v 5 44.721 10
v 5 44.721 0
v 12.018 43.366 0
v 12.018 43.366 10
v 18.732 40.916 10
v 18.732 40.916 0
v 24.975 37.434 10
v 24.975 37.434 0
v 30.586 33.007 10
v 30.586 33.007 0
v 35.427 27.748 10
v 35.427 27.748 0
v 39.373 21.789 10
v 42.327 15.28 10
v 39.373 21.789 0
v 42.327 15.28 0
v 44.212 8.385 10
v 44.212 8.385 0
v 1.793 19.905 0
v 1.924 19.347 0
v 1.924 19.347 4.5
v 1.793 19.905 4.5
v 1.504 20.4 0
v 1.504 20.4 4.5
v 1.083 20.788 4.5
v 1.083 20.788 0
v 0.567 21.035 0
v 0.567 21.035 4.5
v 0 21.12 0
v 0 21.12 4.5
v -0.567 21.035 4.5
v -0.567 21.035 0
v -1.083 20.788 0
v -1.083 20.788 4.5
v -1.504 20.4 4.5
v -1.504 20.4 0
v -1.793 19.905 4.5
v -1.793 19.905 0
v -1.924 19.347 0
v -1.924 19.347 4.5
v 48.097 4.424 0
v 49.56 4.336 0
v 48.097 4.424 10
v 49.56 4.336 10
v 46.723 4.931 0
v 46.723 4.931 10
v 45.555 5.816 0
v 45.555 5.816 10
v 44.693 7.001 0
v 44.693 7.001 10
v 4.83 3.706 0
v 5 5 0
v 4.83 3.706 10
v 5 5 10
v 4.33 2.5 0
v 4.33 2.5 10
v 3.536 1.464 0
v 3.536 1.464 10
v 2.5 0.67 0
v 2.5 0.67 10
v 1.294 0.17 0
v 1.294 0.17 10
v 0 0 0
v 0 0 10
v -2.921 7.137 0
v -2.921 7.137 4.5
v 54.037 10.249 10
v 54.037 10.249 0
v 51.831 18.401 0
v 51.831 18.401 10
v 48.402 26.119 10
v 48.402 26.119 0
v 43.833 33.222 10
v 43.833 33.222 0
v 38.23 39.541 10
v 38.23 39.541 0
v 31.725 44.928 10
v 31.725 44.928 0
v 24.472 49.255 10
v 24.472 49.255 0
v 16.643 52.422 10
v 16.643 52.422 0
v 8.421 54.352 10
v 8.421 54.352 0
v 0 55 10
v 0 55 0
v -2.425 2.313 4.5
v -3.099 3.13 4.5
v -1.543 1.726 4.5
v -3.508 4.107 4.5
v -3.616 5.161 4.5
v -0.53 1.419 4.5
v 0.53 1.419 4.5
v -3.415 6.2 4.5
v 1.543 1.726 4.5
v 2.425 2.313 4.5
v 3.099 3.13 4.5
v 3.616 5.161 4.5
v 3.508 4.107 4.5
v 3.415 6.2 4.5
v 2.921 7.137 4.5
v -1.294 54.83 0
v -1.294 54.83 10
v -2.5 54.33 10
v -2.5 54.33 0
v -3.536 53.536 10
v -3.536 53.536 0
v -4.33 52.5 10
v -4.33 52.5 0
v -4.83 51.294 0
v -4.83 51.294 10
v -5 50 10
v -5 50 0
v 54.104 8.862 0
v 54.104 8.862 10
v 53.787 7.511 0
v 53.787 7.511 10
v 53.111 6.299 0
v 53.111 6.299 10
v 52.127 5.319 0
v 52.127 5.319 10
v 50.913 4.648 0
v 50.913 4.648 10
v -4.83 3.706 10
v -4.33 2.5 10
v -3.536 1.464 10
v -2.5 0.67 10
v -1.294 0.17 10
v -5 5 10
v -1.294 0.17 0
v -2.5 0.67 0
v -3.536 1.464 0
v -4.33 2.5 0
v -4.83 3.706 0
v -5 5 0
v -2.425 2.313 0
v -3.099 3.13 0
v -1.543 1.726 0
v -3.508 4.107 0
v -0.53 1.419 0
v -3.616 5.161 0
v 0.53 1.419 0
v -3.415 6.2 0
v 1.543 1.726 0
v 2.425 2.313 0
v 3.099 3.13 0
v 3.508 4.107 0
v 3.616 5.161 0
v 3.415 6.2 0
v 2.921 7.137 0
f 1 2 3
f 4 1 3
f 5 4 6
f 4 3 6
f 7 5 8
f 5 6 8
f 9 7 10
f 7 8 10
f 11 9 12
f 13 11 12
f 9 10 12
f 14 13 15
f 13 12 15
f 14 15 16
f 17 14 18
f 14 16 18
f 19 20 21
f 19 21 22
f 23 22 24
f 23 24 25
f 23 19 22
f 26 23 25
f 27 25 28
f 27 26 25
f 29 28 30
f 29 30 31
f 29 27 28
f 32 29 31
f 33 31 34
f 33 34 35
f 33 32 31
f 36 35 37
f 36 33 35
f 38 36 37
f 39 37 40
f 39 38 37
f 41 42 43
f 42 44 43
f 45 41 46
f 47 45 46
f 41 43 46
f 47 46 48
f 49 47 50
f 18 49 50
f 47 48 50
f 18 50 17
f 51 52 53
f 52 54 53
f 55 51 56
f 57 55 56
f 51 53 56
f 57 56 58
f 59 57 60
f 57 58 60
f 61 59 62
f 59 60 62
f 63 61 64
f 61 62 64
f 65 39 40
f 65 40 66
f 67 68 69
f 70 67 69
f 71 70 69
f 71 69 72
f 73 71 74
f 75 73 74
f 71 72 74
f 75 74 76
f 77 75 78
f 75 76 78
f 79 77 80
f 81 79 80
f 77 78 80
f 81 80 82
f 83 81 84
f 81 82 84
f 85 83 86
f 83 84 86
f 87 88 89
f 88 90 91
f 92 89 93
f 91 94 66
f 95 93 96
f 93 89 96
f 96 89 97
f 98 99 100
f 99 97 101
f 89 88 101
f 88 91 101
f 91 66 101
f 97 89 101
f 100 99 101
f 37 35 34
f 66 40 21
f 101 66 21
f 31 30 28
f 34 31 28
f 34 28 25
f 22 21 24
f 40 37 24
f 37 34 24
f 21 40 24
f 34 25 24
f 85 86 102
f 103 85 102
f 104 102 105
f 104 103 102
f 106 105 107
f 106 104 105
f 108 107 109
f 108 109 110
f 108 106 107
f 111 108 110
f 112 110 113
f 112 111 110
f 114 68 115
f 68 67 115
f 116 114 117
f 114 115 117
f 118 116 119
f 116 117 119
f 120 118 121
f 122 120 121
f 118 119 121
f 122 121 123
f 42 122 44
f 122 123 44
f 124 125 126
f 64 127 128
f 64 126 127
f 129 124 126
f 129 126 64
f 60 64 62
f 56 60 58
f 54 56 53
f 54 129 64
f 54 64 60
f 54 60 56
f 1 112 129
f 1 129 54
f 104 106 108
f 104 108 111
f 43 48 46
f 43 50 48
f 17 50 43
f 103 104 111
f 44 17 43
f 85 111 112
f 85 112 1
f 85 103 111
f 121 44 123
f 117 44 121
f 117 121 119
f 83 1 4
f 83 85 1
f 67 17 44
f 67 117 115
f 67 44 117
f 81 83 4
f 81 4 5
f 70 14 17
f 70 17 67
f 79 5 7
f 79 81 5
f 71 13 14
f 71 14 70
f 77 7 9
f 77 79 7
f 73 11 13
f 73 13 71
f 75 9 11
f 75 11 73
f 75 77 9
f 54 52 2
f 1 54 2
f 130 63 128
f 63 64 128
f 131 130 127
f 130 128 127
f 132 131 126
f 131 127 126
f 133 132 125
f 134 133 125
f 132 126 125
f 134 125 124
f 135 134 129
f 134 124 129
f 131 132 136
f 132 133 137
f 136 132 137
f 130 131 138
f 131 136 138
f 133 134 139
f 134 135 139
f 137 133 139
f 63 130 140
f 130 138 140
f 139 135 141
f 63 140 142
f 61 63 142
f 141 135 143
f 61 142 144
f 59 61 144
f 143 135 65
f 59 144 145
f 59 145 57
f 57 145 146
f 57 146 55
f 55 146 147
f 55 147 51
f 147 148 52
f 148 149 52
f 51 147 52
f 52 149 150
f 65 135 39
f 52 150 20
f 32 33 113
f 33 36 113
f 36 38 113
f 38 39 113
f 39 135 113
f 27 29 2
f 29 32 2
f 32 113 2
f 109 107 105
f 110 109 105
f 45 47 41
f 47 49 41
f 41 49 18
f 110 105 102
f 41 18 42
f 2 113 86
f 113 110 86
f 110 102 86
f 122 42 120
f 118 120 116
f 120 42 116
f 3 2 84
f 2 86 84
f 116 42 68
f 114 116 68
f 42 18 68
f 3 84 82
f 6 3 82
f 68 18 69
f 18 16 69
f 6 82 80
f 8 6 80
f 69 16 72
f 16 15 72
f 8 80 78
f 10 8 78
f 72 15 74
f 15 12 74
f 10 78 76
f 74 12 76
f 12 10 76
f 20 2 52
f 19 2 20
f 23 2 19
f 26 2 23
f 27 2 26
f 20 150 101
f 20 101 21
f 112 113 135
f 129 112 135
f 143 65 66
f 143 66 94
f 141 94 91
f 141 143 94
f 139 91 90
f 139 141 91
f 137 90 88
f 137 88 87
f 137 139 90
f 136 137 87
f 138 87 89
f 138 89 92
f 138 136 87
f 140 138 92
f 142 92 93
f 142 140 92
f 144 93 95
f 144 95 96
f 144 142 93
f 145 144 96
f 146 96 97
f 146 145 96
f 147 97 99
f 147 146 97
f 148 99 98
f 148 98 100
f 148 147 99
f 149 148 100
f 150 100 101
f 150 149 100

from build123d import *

# Parameters (mm, degrees)
EXTRUDE_THIN1_DEPTH = 10
FILLET1_R           = 5
FILLET2_R           = 5
FILLET3_R           = 5
FILLET4_R           = 5
FILLET5_R           = 5
CUT_EXTRUDE1_DEPTH  = 4.5


with BuildPart() as part:
    # Sketch1 → Extrude-Thin1 (new body)
    with BuildSketch(Plane.XY):
        with BuildLine():
            Line((5, 0), (5, 44.72135955))
            ThreePointArc((5, 44.72135955), (32.200514423, 31.434485377), (44.828761414, 3.922008424))
            Line((44.828761414, 3.922008424), (54.790708395, 4.793565851))
            ThreePointArc((54.790708395, 4.793565851), (35.273871656, 42.198980774), (-5, 54.772255751))
            Line((-5, 54.772255751), (-5, 0))
            Line((-5, 0), (5, 0))
        make_face()
    extrude(amount=EXTRUDE_THIN1_DEPTH)

    # Fillet1
    fillet1_edges = [part.edges().sort_by_distance(p)[0] for p in [
        (-5, 54.772255751, 5),
    ]]
    fillet(fillet1_edges, radius=FILLET1_R)

    # Fillet2
    fillet2_edges = [part.edges().sort_by_distance(p)[0] for p in [
        (54.790708395, 4.793565851, 5),
    ]]
    fillet(fillet2_edges, radius=FILLET2_R)

    # Fillet3
    fillet3_edges = [part.edges().sort_by_distance(p)[0] for p in [
        (44.828761414, 3.922008424, 5),
    ]]
    fillet(fillet3_edges, radius=FILLET3_R - 0.0001)  # a hair under: the kernel refuses the full size

    # Fillet4
    fillet4_edges = [part.edges().sort_by_distance(p)[0] for p in [
        (5, 0, 5),
    ]]
    fillet(fillet4_edges, radius=FILLET4_R)

    # Fillet5
    fillet5_edges = [part.edges().sort_by_distance(p)[0] for p in [
        (-5, 0, 5),
    ]]
    fillet(fillet5_edges, radius=FILLET5_R - 0.0001)  # a hair under: the kernel refuses the full size

    # Sketch2 → Cut-Extrude1 (cut)
    with BuildSketch(Plane(origin=(0, 0, 0), x_dir=(-1, 0, 0), z_dir=(0, 0, -1))):
        with BuildLine():
            Line((1.923996328, 19.347205988), (2.921, 7.13741415))
            ThreePointArc((2.921, 7.13741415), (0, 1.3805), (-2.921, 7.13741415))
            Line((-2.921, 7.13741415), (-1.923996328, 19.347205988))
            ThreePointArc((-1.923996328, 19.347205988), (0, 21.1205), (1.923996328, 19.347205988))
        make_face()
    extrude(amount=-CUT_EXTRUDE1_DEPTH, mode=Mode.SUBTRACT)


solid = part.part
